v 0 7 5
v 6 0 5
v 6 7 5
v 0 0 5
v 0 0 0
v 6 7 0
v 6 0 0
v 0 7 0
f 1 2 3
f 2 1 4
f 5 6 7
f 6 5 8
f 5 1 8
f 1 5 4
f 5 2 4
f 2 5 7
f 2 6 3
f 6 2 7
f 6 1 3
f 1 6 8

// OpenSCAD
translate([1.0, 1.5, 2.5]) color([0.8423333270773672, 0.5829481802462215, 0.7181316517768294]) cube([2, 3, 5], center=true);
translate([3.0, 1.5, 2.5]) color([0.8070553799750758, 0.06635913103778524, 0.08464313683307012]) cube([2, 3, 5], center=true);
translate([5.0, 1.5, 2.5]) color([0.8688953140043785, 0.03941582937802879, 0.22509065367649606]) cube([2, 3, 5], center=true);
translate([1.5, 4.0, 2.5]) color([0.04063202664590093, 0.015285139969726802, 0.8439546856924078]) cube([3, 2, 5], center=true);
translate([4.5, 4.0, 2.5]) color([0.3305943672500803, 0.1606900602627206, 0.1488194902889095]) cube([3, 2, 5], center=true);
translate([1.5, 6.0, 2.5]) color([0.656083661770337, 0.9685982716927071, 0.5049996926056783]) cube([3, 2, 5], center=true);
translate([4.5, 6.0, 2.5]) color([0.9010904768840049, 0.5024285989524275, 0.5738724774915492]) cube([3, 2, 5], center=true);
